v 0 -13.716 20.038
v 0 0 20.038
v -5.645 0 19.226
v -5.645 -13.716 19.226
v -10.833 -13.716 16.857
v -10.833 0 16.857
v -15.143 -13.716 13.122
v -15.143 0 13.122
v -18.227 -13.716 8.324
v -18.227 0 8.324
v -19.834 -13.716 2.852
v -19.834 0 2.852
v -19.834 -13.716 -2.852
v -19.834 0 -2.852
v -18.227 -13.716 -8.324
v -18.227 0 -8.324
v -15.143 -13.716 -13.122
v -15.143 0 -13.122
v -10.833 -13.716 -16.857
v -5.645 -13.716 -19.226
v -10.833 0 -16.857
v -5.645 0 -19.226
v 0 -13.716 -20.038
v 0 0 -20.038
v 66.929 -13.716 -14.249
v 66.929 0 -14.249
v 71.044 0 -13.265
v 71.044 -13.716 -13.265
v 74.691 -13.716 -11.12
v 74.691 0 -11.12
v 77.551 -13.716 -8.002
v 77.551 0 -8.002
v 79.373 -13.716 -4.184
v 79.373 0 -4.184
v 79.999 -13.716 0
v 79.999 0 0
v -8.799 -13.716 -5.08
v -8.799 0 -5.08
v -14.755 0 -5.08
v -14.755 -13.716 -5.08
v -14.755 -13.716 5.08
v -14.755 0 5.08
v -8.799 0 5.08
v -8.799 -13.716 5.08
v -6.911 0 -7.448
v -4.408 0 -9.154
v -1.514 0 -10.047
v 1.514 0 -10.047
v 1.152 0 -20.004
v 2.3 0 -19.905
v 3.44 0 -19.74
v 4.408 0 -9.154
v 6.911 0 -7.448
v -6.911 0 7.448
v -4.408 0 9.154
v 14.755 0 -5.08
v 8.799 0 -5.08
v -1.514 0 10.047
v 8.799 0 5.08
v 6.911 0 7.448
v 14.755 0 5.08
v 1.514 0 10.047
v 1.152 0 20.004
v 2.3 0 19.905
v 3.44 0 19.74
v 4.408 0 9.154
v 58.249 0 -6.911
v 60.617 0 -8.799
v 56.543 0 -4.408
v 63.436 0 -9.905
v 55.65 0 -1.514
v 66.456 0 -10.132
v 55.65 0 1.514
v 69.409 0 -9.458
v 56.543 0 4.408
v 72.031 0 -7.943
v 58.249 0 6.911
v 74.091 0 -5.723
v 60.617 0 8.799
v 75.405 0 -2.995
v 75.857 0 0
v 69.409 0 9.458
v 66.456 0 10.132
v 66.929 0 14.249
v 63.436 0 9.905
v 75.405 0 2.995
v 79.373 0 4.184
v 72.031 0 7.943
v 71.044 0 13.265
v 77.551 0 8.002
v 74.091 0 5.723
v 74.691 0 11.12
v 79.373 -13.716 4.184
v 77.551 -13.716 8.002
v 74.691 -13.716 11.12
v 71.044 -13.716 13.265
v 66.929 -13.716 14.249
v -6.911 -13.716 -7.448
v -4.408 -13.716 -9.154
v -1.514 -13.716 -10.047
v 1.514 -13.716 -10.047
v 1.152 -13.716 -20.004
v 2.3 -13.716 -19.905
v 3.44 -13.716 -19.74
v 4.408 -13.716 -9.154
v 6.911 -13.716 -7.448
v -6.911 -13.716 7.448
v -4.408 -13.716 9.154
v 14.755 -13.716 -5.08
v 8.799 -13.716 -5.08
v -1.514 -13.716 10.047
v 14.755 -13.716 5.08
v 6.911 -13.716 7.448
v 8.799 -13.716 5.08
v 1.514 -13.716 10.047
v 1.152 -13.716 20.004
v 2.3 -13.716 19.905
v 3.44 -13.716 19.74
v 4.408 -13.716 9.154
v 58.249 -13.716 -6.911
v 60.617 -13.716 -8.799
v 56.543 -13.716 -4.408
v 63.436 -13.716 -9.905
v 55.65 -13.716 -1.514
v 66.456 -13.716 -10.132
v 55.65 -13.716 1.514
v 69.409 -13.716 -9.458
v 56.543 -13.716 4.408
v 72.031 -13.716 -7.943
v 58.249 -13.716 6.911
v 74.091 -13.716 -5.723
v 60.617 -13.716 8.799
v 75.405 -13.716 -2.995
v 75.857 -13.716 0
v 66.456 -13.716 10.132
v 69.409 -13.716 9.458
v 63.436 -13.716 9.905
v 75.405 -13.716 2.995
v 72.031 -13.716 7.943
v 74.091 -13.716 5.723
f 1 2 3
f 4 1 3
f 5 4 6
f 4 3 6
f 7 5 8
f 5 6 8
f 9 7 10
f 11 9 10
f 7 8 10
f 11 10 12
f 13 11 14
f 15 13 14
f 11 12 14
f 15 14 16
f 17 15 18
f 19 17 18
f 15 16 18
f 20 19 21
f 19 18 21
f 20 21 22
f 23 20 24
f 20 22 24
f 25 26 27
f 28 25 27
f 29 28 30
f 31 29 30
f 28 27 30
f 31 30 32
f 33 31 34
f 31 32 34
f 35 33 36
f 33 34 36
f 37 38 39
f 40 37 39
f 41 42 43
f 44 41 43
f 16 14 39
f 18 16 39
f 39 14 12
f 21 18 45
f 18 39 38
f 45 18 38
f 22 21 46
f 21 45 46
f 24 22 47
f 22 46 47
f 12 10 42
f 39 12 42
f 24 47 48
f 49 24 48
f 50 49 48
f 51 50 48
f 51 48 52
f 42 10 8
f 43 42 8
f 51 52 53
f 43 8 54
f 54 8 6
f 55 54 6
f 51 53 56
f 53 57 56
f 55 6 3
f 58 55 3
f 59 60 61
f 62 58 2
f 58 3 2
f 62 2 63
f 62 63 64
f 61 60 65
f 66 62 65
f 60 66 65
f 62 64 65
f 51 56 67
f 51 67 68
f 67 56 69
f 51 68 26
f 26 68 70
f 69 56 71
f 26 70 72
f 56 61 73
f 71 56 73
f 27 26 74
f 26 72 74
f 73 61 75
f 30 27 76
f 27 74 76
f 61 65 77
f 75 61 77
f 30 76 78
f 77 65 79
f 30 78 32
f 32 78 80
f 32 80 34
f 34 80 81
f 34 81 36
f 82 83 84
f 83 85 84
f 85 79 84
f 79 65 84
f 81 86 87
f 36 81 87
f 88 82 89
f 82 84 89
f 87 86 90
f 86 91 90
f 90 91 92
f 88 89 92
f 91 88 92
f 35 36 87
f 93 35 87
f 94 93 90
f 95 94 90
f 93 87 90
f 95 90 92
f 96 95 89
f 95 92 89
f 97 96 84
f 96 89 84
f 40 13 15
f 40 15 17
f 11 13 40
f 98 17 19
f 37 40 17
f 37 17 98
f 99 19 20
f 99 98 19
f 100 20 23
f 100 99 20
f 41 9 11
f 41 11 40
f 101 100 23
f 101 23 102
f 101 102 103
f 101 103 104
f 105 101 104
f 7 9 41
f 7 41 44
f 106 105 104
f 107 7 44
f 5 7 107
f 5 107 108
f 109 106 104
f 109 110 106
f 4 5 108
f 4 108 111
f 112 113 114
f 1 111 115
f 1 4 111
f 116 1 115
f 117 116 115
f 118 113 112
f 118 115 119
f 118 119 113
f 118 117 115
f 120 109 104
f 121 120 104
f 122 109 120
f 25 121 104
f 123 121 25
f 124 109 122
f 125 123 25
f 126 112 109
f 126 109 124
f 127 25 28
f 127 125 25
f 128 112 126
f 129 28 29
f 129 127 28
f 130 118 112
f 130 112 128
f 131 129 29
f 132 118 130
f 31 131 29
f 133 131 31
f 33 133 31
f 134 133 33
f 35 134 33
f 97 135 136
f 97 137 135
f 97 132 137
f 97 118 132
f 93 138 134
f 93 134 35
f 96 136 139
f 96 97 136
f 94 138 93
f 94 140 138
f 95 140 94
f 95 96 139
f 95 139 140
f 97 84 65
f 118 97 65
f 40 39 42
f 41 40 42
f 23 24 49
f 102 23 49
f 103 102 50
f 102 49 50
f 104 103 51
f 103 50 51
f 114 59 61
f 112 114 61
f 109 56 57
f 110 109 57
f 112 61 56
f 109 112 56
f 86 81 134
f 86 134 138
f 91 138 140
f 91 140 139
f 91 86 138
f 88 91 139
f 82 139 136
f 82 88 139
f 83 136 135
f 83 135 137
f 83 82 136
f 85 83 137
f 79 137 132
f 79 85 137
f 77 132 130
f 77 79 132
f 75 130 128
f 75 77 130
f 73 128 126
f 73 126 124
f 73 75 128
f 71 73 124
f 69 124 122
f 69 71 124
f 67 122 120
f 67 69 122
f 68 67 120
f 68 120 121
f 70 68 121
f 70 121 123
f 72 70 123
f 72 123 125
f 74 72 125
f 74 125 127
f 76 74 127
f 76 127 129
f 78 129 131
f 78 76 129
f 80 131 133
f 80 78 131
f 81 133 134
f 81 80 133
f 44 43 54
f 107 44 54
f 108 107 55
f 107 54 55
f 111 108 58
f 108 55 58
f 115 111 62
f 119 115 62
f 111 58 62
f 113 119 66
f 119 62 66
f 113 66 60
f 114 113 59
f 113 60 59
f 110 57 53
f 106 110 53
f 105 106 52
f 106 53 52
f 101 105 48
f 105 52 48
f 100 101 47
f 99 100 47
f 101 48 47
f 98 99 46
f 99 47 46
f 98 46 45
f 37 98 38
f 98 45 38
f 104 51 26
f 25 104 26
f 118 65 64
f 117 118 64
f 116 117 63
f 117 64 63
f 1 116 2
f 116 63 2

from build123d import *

# Parameters (mm, degrees)
F0_R     = 10.16
F1_DEPTH = 13.716


with BuildPart() as f1:
    # F0 (on Front) → F1 (new body)
    with BuildSketch(Plane.XZ):
        with BuildLine():
            Line((3.440324, 19.740039), (0, 20.037589))
            ThreePointArc((0, 20.037589), (-20.037589, 0), (0, -20.037589))
            Line((0, -20.037589), (3.440324, -19.740039))
            ThreePointArc((3.440324, -19.740039), (15.336896, -12.895138), (20.037589, 0))
            ThreePointArc((20.037589, 0), (15.336896, 12.895138), (3.440324, 19.740039))
        make_face()
        with BuildLine():
            ThreePointArc((-8.798818, 5.08), (0, 10.16), (8.798818, 5.08))
            Line((8.798818, 5.08), (14.754587, 5.08))
            Line((14.754587, 5.08), (14.754587, -5.08))
            Line((14.754587, -5.08), (8.798818, -5.08))
            ThreePointArc((8.798818, -5.08), (0, -10.16), (-8.798818, -5.08))
            Line((-8.798818, -5.08), (-14.754587, -5.08))
            Line((-14.754587, -5.08), (-14.754587, 5.08))
            Line((-14.754587, 5.08), (-8.798818, 5.08))
        make_face(mode=Mode.SUBTRACT)
        with BuildLine():
            ThreePointArc((3.440324, 19.740039), (1.726584, 19.963063), (0, 20.037589))
            Line((0, 20.037589), (3.440324, 19.740039))
        make_face()
        with BuildLine():
            Line((3.440324, -19.740039), (0, -20.037589))
            ThreePointArc((0, -20.037589), (1.726584, -19.963063), (3.440324, -19.740039))
        make_face()
        with BuildLine():
            Line((66.929123, 14.248961), (3.440324, 19.740039))
            ThreePointArc((3.440324, 19.740039), (15.336896, 12.895138), (20.037589, 0))
            ThreePointArc((20.037589, 0), (15.336896, -12.895138), (3.440324, -19.740039))
            Line((3.440324, -19.740039), (66.929123, -14.248961))
            ThreePointArc((66.929123, -14.248961), (51.394591, 0), (66.929123, 14.248961))
        make_face()
        with BuildLine():
            ThreePointArc((79.998901, 0), (76.236606, 9.667626), (66.929123, 14.248961))
            ThreePointArc((66.929123, 14.248961), (51.394591, 0), (66.929123, -14.248961))
            ThreePointArc((66.929123, -14.248961), (76.236606, -9.667626), (79.998901, 0))
        make_face()
        with Locations((65.696746, 0)):
            Circle(F0_R, mode=Mode.SUBTRACT)
    extrude(amount=F1_DEPTH)


solid = f1.part
